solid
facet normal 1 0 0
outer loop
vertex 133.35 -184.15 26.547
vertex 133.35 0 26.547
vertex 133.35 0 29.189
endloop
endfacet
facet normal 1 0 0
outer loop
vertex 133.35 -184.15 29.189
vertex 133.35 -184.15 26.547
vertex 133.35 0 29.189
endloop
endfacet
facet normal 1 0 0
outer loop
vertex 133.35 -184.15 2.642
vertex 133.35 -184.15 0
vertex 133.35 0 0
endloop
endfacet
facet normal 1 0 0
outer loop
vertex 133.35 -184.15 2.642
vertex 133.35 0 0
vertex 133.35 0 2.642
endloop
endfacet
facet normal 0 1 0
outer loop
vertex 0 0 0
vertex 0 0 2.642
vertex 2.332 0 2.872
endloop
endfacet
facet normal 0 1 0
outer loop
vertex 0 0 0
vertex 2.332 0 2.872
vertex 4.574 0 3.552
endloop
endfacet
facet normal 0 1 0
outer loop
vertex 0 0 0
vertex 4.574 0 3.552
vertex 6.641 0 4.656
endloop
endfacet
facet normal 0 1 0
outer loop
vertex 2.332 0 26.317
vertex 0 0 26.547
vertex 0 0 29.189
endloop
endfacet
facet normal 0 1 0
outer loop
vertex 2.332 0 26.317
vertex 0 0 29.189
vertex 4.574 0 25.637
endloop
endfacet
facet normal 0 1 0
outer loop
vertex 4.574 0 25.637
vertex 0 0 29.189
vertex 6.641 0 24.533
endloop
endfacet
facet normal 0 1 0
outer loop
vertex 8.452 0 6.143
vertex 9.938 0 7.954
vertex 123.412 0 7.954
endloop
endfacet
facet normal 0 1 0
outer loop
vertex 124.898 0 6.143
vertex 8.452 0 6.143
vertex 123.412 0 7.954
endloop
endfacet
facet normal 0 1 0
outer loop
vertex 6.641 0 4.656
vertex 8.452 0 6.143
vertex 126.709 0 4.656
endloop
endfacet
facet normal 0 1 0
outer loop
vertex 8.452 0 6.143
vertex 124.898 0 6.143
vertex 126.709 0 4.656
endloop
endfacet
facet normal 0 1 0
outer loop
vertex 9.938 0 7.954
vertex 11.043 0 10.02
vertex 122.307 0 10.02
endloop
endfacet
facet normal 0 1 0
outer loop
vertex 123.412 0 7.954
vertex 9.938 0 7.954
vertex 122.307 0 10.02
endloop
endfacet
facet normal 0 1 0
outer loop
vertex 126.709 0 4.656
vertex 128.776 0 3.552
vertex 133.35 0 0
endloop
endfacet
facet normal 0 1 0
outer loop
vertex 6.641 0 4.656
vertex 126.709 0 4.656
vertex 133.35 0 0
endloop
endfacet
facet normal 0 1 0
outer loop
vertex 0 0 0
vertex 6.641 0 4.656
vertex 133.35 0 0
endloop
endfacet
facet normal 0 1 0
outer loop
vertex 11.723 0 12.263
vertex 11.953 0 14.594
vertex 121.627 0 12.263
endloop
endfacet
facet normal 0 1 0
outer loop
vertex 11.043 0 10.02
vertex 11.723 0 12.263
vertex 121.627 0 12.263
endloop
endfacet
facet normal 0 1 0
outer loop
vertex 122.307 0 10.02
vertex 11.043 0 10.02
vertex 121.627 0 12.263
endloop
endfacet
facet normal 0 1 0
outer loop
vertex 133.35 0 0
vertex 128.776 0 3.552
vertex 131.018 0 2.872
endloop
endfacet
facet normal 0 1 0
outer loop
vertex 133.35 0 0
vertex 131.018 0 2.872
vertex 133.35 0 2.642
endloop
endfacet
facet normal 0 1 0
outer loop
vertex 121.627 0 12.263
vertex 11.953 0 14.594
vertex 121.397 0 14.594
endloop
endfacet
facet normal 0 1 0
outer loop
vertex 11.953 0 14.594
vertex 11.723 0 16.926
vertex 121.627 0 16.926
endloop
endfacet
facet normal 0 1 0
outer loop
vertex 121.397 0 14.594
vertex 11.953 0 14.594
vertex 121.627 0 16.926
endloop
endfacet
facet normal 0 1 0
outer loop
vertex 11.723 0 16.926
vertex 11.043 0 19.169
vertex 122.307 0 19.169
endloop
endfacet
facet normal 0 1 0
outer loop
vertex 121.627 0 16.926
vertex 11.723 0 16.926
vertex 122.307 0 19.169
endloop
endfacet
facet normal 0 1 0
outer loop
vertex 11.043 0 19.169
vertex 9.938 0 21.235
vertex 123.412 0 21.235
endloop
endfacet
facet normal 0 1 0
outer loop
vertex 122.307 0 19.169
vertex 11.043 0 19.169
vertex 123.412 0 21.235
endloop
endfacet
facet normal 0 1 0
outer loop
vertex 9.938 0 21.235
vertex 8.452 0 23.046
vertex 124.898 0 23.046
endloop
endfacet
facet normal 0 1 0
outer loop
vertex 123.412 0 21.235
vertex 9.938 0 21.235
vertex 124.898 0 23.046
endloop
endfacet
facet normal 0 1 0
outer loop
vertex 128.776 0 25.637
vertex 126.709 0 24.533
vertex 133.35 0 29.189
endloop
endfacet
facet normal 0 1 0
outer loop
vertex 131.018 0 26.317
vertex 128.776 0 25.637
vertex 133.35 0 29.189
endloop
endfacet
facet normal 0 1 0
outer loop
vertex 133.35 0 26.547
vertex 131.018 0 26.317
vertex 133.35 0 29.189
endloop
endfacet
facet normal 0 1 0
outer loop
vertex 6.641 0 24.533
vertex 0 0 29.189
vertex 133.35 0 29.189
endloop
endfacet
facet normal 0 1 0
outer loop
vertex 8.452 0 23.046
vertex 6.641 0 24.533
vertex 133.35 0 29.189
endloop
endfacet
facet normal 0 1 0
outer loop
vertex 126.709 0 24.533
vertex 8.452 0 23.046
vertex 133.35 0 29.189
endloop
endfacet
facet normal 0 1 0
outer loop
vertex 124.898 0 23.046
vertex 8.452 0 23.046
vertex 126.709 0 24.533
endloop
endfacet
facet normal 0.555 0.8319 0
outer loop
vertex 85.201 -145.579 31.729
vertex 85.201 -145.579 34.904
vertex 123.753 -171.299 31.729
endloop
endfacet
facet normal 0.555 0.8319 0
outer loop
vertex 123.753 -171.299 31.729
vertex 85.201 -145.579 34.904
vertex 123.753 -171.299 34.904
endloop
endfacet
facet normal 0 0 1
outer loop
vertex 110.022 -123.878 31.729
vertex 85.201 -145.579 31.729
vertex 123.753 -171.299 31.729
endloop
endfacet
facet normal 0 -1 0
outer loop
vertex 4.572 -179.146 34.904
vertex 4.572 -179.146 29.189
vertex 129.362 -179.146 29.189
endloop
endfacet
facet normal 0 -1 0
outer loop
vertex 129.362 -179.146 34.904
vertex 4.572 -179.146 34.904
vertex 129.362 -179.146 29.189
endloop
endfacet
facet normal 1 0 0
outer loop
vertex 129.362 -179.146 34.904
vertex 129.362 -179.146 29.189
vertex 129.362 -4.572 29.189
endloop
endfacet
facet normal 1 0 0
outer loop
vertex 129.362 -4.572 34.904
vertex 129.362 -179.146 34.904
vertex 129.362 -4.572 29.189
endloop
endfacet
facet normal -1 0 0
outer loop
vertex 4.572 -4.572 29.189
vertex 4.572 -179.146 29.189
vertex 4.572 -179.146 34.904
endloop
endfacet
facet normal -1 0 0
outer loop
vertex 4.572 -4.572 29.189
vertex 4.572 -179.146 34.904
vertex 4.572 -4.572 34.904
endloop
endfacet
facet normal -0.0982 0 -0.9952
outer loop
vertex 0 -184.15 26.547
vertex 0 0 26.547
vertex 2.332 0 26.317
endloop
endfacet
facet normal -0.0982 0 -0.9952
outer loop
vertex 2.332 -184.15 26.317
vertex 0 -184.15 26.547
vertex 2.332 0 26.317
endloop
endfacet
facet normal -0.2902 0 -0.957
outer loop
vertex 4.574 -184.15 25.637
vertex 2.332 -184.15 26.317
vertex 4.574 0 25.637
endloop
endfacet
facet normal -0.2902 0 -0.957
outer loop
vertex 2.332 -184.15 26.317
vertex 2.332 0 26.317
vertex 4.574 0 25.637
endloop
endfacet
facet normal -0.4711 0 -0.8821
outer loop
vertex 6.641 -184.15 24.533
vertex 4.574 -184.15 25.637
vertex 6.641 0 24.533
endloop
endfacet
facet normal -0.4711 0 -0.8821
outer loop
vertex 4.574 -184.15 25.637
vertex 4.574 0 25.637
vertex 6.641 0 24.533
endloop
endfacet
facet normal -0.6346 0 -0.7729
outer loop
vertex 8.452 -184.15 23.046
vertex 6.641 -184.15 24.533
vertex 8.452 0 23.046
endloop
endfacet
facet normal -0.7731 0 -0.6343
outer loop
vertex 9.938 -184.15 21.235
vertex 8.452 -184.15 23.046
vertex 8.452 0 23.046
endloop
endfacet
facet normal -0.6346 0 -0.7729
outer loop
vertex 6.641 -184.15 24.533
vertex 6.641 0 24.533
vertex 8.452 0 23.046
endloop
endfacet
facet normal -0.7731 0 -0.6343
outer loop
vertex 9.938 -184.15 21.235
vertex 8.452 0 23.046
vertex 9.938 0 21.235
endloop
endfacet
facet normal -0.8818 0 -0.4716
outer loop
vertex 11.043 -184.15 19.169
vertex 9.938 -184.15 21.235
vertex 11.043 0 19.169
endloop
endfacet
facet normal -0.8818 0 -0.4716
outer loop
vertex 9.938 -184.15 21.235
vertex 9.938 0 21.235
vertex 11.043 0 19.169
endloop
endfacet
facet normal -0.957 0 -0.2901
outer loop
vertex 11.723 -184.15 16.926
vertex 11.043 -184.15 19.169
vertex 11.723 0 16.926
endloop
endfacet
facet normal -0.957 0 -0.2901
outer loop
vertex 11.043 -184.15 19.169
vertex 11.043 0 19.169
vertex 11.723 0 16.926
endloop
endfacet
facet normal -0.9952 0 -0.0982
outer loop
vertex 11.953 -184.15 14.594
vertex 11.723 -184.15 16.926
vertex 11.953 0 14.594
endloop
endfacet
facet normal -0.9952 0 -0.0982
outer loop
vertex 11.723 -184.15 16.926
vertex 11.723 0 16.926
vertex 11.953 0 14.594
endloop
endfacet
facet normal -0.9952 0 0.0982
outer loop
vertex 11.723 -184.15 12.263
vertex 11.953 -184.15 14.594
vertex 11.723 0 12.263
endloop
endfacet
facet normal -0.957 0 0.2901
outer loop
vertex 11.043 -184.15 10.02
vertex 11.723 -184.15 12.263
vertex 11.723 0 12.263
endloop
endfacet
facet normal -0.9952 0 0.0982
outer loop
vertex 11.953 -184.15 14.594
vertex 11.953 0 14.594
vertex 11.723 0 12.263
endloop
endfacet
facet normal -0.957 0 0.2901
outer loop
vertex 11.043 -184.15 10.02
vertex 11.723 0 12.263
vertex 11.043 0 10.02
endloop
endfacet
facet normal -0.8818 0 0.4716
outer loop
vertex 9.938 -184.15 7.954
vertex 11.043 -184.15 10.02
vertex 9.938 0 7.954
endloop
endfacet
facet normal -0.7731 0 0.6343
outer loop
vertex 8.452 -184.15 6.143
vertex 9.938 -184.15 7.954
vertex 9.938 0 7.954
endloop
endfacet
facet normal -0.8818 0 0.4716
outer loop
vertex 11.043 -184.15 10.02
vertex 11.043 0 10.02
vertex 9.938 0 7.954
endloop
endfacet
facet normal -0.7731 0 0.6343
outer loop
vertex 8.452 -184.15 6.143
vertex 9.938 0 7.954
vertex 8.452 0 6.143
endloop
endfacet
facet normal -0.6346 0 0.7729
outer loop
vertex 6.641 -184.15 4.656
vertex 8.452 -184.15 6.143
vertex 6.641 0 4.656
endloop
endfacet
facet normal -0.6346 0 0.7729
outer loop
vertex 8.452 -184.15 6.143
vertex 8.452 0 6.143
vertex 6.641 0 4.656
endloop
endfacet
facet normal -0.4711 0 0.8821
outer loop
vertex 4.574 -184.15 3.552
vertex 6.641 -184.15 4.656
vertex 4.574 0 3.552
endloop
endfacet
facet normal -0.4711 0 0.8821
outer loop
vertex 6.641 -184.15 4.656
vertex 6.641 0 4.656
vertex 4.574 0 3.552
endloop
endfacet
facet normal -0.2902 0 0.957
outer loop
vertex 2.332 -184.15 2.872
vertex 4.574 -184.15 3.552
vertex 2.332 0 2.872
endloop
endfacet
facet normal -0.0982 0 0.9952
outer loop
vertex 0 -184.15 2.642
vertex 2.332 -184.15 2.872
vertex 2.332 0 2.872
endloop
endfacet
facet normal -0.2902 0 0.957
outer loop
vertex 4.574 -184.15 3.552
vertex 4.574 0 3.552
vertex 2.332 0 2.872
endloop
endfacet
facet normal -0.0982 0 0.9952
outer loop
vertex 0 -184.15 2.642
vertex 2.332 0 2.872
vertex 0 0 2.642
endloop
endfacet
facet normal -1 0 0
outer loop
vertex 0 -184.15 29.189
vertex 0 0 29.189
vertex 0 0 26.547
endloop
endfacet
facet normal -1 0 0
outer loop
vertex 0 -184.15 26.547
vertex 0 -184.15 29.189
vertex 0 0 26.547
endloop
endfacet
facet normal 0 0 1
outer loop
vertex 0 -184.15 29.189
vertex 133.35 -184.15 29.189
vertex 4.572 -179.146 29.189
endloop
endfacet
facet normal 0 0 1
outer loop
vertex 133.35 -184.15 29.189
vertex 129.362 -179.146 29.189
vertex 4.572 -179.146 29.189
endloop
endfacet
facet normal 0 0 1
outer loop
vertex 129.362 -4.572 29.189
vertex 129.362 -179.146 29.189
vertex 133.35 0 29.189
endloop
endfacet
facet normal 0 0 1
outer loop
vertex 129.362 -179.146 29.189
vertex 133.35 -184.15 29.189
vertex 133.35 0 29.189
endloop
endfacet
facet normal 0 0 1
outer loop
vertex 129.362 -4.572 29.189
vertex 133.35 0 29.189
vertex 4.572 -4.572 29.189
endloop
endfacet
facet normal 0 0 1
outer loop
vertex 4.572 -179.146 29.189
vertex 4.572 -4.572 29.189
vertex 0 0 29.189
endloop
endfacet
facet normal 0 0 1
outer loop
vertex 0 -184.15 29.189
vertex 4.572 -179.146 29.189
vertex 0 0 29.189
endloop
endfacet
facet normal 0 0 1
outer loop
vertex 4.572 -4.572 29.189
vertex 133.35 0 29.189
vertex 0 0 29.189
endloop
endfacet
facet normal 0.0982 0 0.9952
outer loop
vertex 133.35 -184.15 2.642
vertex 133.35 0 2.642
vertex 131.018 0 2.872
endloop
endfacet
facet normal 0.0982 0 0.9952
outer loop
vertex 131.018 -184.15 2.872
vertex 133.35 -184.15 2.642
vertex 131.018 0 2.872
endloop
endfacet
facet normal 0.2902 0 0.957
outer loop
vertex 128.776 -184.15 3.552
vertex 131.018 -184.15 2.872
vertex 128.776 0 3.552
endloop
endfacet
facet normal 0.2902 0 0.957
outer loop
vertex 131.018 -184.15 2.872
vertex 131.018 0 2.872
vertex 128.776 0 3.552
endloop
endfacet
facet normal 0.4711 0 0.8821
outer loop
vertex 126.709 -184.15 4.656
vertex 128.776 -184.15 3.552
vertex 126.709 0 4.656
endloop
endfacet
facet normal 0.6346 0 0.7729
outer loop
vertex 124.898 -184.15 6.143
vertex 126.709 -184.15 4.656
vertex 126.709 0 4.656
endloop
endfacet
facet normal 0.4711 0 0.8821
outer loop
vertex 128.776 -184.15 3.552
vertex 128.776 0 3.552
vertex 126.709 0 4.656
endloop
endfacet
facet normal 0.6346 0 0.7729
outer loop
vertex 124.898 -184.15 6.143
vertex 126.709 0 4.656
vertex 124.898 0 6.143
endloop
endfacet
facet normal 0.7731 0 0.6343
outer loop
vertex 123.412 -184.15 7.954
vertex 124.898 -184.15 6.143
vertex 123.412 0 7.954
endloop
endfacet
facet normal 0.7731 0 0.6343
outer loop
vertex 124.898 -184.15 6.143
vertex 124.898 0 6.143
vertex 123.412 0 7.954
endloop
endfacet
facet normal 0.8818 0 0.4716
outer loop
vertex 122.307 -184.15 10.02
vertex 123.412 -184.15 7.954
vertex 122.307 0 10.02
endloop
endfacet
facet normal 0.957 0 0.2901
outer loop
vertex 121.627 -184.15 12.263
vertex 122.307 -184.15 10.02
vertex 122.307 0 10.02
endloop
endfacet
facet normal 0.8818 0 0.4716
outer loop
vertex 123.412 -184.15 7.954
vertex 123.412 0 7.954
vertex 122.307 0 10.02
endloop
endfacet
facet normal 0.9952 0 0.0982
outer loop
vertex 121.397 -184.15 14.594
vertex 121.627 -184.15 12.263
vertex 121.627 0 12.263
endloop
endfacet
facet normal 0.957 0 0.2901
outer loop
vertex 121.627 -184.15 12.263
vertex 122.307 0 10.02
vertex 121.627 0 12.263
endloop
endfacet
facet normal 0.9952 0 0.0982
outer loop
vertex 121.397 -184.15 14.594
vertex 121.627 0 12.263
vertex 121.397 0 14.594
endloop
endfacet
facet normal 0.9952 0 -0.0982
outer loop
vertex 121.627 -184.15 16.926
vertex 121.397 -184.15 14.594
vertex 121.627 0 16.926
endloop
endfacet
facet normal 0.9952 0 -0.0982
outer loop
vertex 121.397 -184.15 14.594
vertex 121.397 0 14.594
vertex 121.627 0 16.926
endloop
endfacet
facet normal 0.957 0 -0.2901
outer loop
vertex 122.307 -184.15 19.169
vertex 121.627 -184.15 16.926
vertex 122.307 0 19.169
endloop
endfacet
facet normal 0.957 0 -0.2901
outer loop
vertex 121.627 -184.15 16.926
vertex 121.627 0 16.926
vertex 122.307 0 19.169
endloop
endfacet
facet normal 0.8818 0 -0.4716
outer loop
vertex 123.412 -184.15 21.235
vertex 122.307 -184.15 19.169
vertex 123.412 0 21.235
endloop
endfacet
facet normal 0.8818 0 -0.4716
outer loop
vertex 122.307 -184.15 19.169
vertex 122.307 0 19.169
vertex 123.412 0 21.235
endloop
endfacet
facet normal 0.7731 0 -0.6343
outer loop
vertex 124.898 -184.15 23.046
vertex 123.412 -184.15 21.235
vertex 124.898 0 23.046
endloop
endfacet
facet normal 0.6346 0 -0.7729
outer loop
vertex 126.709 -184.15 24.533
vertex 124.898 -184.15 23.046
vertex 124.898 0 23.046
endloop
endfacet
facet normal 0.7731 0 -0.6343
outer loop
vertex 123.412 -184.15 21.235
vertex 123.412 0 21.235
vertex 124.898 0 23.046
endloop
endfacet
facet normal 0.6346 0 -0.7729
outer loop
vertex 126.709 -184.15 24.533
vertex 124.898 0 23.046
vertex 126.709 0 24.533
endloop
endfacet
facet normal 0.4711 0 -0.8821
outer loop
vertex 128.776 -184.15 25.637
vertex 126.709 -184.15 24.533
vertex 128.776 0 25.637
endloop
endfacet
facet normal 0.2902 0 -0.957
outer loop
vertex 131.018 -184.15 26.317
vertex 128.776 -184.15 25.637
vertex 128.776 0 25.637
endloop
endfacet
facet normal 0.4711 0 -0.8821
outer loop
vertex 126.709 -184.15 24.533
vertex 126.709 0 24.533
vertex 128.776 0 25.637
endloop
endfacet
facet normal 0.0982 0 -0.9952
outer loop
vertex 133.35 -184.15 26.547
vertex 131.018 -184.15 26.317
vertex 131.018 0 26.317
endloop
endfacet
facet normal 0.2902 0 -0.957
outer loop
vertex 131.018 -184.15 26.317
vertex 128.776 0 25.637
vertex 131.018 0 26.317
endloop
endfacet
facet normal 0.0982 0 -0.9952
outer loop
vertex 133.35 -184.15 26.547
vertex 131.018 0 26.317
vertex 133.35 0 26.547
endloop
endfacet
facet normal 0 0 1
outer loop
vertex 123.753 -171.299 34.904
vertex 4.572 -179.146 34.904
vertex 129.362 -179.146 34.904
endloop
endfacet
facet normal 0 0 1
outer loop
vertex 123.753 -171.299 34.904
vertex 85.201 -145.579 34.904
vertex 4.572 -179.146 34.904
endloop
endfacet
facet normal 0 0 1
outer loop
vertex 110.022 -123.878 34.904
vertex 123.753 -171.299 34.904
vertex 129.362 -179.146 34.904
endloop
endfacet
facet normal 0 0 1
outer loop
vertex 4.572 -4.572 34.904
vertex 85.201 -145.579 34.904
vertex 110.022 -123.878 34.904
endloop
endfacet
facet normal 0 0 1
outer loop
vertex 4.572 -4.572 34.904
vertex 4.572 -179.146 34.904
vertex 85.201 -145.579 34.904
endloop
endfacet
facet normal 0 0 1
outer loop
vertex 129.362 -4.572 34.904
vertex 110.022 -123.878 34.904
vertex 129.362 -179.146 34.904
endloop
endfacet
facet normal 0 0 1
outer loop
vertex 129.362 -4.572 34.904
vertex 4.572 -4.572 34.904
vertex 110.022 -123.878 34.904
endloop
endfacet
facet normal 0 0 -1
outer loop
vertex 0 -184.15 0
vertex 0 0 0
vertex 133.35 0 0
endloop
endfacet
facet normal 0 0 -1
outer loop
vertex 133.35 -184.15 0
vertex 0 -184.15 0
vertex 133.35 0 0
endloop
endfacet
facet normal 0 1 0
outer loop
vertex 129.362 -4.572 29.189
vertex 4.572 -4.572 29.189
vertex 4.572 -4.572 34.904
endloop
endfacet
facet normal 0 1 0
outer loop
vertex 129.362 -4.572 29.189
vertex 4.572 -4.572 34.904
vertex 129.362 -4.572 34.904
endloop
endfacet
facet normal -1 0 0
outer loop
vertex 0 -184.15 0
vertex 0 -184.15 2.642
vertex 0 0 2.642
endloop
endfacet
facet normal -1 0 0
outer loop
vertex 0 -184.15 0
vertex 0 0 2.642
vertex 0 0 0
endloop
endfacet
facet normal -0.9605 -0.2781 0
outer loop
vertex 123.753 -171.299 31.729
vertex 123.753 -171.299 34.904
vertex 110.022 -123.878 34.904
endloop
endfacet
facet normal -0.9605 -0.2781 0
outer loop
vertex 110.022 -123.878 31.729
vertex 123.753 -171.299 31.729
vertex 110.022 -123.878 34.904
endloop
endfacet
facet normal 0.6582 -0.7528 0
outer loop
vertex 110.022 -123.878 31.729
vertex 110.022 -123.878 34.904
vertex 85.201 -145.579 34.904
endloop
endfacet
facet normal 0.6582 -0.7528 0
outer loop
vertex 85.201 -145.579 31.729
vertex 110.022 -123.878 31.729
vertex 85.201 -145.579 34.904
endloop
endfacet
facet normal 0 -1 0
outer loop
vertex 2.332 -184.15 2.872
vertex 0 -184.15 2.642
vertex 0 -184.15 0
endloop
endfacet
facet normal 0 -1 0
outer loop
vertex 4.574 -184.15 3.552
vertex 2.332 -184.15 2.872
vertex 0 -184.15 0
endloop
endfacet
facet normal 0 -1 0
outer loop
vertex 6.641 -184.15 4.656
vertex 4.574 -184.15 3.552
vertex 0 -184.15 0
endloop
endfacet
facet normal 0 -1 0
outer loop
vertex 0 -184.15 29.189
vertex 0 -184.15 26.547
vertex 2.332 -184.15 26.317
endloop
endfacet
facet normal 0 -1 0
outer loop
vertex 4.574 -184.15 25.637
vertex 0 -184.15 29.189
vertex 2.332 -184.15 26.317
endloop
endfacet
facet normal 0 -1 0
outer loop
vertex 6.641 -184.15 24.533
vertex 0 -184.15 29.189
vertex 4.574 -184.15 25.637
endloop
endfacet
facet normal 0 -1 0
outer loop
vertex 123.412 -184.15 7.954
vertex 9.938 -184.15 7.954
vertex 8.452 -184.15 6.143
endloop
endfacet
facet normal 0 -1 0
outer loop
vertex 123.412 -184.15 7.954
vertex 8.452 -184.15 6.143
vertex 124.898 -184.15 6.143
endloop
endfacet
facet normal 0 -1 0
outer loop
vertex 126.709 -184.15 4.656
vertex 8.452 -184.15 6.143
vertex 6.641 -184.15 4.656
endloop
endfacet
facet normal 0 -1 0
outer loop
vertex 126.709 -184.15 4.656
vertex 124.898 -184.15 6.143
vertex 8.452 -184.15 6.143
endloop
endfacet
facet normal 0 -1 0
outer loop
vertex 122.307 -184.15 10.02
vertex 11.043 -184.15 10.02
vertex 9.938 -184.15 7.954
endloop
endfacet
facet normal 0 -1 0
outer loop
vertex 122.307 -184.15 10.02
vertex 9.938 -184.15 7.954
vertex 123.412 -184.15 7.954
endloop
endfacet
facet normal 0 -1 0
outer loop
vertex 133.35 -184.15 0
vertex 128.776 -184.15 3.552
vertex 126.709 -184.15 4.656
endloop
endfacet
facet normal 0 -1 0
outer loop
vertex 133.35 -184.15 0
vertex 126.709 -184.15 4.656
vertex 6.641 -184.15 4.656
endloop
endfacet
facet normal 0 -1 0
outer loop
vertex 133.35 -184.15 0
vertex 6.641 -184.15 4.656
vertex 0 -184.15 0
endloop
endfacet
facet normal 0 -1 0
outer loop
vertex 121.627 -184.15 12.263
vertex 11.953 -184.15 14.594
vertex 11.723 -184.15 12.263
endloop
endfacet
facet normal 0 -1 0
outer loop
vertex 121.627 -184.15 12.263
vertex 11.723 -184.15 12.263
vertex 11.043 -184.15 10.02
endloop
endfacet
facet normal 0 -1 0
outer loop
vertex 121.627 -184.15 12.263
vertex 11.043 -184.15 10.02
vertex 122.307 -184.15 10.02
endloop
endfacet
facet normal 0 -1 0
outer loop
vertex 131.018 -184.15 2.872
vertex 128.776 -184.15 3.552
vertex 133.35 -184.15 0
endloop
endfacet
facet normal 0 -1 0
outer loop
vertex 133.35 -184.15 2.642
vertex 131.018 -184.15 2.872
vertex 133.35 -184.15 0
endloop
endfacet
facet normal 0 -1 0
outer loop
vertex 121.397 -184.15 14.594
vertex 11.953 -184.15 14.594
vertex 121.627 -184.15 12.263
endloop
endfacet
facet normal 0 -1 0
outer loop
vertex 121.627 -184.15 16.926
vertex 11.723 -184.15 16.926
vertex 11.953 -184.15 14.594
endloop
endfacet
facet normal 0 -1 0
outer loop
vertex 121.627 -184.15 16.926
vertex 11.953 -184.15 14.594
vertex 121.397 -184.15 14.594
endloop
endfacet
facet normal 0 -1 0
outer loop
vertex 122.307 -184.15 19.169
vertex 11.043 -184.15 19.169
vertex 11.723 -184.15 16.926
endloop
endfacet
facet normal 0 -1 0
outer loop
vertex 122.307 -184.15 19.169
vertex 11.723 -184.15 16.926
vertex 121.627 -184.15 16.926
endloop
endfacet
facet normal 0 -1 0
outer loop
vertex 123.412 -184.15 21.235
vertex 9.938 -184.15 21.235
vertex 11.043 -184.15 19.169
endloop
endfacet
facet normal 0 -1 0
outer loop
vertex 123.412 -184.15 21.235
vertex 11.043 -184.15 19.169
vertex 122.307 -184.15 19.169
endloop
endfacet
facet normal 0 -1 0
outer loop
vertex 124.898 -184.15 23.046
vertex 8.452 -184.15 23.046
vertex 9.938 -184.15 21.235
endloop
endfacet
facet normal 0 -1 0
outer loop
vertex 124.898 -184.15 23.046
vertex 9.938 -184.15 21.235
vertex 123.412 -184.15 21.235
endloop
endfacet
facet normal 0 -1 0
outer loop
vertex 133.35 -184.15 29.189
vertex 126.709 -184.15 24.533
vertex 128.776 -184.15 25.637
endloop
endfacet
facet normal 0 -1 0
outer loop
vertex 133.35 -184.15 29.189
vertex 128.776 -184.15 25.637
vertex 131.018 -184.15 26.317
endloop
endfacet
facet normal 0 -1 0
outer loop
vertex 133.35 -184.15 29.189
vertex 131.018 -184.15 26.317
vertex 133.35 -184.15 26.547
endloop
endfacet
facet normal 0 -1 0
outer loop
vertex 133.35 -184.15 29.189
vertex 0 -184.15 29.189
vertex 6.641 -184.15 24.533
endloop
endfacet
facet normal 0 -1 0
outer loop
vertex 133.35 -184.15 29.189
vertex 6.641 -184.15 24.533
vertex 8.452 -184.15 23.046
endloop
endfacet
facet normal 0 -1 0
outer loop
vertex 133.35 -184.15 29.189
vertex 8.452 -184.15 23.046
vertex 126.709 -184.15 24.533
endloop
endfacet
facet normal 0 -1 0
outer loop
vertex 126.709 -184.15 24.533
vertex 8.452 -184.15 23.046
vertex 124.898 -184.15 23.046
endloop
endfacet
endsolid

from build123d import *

# Parameters (mm, degrees)
F1_DEPTH = 184.15
F2_W     = 124.7902
F2_H     = 174.5742
F3_DEPTH = 5.715
F5_DEPTH = 3.175


with BuildPart() as f1:
    # F0 (on Front) → F1 (new body)
    with BuildSketch(Plane.XZ):
        with BuildLine():
            Line((0, 2.641868), (0, 0))
            Line((0, 0), (133.35, 0))
            Line((133.35, 0), (133.35, 2.641868))
            ThreePointArc((133.35, 2.641868), (121.39739, 14.594478), (133.35, 26.547088))
            Line((133.35, 26.547088), (133.35, 29.188956))
            Line((133.35, 29.188956), (0, 29.188956))
            Line((0, 29.188956), (0, 26.547088))
            ThreePointArc((0, 26.547088), (11.95261, 14.594478), (0, 2.641868))
        make_face()
    extrude(amount=F1_DEPTH)

    # F2 (on face) → F3 (join)
    with BuildSketch(Plane.XY.offset(29.188956)):
        with Locations((66.9671, -91.8591)):
            Rectangle(F2_W, F2_H)
    extrude(amount=F3_DEPTH)

    # F4 (on face) → F5 (cut)
    with BuildSketch(Plane.XY.offset(34.903956)):
        Polygon((85.200642, -145.579033), (123.752596, -171.298692), (110.021826, -123.877873), align=None)
    extrude(amount=-F5_DEPTH, mode=Mode.SUBTRACT)


solid = f1.part
